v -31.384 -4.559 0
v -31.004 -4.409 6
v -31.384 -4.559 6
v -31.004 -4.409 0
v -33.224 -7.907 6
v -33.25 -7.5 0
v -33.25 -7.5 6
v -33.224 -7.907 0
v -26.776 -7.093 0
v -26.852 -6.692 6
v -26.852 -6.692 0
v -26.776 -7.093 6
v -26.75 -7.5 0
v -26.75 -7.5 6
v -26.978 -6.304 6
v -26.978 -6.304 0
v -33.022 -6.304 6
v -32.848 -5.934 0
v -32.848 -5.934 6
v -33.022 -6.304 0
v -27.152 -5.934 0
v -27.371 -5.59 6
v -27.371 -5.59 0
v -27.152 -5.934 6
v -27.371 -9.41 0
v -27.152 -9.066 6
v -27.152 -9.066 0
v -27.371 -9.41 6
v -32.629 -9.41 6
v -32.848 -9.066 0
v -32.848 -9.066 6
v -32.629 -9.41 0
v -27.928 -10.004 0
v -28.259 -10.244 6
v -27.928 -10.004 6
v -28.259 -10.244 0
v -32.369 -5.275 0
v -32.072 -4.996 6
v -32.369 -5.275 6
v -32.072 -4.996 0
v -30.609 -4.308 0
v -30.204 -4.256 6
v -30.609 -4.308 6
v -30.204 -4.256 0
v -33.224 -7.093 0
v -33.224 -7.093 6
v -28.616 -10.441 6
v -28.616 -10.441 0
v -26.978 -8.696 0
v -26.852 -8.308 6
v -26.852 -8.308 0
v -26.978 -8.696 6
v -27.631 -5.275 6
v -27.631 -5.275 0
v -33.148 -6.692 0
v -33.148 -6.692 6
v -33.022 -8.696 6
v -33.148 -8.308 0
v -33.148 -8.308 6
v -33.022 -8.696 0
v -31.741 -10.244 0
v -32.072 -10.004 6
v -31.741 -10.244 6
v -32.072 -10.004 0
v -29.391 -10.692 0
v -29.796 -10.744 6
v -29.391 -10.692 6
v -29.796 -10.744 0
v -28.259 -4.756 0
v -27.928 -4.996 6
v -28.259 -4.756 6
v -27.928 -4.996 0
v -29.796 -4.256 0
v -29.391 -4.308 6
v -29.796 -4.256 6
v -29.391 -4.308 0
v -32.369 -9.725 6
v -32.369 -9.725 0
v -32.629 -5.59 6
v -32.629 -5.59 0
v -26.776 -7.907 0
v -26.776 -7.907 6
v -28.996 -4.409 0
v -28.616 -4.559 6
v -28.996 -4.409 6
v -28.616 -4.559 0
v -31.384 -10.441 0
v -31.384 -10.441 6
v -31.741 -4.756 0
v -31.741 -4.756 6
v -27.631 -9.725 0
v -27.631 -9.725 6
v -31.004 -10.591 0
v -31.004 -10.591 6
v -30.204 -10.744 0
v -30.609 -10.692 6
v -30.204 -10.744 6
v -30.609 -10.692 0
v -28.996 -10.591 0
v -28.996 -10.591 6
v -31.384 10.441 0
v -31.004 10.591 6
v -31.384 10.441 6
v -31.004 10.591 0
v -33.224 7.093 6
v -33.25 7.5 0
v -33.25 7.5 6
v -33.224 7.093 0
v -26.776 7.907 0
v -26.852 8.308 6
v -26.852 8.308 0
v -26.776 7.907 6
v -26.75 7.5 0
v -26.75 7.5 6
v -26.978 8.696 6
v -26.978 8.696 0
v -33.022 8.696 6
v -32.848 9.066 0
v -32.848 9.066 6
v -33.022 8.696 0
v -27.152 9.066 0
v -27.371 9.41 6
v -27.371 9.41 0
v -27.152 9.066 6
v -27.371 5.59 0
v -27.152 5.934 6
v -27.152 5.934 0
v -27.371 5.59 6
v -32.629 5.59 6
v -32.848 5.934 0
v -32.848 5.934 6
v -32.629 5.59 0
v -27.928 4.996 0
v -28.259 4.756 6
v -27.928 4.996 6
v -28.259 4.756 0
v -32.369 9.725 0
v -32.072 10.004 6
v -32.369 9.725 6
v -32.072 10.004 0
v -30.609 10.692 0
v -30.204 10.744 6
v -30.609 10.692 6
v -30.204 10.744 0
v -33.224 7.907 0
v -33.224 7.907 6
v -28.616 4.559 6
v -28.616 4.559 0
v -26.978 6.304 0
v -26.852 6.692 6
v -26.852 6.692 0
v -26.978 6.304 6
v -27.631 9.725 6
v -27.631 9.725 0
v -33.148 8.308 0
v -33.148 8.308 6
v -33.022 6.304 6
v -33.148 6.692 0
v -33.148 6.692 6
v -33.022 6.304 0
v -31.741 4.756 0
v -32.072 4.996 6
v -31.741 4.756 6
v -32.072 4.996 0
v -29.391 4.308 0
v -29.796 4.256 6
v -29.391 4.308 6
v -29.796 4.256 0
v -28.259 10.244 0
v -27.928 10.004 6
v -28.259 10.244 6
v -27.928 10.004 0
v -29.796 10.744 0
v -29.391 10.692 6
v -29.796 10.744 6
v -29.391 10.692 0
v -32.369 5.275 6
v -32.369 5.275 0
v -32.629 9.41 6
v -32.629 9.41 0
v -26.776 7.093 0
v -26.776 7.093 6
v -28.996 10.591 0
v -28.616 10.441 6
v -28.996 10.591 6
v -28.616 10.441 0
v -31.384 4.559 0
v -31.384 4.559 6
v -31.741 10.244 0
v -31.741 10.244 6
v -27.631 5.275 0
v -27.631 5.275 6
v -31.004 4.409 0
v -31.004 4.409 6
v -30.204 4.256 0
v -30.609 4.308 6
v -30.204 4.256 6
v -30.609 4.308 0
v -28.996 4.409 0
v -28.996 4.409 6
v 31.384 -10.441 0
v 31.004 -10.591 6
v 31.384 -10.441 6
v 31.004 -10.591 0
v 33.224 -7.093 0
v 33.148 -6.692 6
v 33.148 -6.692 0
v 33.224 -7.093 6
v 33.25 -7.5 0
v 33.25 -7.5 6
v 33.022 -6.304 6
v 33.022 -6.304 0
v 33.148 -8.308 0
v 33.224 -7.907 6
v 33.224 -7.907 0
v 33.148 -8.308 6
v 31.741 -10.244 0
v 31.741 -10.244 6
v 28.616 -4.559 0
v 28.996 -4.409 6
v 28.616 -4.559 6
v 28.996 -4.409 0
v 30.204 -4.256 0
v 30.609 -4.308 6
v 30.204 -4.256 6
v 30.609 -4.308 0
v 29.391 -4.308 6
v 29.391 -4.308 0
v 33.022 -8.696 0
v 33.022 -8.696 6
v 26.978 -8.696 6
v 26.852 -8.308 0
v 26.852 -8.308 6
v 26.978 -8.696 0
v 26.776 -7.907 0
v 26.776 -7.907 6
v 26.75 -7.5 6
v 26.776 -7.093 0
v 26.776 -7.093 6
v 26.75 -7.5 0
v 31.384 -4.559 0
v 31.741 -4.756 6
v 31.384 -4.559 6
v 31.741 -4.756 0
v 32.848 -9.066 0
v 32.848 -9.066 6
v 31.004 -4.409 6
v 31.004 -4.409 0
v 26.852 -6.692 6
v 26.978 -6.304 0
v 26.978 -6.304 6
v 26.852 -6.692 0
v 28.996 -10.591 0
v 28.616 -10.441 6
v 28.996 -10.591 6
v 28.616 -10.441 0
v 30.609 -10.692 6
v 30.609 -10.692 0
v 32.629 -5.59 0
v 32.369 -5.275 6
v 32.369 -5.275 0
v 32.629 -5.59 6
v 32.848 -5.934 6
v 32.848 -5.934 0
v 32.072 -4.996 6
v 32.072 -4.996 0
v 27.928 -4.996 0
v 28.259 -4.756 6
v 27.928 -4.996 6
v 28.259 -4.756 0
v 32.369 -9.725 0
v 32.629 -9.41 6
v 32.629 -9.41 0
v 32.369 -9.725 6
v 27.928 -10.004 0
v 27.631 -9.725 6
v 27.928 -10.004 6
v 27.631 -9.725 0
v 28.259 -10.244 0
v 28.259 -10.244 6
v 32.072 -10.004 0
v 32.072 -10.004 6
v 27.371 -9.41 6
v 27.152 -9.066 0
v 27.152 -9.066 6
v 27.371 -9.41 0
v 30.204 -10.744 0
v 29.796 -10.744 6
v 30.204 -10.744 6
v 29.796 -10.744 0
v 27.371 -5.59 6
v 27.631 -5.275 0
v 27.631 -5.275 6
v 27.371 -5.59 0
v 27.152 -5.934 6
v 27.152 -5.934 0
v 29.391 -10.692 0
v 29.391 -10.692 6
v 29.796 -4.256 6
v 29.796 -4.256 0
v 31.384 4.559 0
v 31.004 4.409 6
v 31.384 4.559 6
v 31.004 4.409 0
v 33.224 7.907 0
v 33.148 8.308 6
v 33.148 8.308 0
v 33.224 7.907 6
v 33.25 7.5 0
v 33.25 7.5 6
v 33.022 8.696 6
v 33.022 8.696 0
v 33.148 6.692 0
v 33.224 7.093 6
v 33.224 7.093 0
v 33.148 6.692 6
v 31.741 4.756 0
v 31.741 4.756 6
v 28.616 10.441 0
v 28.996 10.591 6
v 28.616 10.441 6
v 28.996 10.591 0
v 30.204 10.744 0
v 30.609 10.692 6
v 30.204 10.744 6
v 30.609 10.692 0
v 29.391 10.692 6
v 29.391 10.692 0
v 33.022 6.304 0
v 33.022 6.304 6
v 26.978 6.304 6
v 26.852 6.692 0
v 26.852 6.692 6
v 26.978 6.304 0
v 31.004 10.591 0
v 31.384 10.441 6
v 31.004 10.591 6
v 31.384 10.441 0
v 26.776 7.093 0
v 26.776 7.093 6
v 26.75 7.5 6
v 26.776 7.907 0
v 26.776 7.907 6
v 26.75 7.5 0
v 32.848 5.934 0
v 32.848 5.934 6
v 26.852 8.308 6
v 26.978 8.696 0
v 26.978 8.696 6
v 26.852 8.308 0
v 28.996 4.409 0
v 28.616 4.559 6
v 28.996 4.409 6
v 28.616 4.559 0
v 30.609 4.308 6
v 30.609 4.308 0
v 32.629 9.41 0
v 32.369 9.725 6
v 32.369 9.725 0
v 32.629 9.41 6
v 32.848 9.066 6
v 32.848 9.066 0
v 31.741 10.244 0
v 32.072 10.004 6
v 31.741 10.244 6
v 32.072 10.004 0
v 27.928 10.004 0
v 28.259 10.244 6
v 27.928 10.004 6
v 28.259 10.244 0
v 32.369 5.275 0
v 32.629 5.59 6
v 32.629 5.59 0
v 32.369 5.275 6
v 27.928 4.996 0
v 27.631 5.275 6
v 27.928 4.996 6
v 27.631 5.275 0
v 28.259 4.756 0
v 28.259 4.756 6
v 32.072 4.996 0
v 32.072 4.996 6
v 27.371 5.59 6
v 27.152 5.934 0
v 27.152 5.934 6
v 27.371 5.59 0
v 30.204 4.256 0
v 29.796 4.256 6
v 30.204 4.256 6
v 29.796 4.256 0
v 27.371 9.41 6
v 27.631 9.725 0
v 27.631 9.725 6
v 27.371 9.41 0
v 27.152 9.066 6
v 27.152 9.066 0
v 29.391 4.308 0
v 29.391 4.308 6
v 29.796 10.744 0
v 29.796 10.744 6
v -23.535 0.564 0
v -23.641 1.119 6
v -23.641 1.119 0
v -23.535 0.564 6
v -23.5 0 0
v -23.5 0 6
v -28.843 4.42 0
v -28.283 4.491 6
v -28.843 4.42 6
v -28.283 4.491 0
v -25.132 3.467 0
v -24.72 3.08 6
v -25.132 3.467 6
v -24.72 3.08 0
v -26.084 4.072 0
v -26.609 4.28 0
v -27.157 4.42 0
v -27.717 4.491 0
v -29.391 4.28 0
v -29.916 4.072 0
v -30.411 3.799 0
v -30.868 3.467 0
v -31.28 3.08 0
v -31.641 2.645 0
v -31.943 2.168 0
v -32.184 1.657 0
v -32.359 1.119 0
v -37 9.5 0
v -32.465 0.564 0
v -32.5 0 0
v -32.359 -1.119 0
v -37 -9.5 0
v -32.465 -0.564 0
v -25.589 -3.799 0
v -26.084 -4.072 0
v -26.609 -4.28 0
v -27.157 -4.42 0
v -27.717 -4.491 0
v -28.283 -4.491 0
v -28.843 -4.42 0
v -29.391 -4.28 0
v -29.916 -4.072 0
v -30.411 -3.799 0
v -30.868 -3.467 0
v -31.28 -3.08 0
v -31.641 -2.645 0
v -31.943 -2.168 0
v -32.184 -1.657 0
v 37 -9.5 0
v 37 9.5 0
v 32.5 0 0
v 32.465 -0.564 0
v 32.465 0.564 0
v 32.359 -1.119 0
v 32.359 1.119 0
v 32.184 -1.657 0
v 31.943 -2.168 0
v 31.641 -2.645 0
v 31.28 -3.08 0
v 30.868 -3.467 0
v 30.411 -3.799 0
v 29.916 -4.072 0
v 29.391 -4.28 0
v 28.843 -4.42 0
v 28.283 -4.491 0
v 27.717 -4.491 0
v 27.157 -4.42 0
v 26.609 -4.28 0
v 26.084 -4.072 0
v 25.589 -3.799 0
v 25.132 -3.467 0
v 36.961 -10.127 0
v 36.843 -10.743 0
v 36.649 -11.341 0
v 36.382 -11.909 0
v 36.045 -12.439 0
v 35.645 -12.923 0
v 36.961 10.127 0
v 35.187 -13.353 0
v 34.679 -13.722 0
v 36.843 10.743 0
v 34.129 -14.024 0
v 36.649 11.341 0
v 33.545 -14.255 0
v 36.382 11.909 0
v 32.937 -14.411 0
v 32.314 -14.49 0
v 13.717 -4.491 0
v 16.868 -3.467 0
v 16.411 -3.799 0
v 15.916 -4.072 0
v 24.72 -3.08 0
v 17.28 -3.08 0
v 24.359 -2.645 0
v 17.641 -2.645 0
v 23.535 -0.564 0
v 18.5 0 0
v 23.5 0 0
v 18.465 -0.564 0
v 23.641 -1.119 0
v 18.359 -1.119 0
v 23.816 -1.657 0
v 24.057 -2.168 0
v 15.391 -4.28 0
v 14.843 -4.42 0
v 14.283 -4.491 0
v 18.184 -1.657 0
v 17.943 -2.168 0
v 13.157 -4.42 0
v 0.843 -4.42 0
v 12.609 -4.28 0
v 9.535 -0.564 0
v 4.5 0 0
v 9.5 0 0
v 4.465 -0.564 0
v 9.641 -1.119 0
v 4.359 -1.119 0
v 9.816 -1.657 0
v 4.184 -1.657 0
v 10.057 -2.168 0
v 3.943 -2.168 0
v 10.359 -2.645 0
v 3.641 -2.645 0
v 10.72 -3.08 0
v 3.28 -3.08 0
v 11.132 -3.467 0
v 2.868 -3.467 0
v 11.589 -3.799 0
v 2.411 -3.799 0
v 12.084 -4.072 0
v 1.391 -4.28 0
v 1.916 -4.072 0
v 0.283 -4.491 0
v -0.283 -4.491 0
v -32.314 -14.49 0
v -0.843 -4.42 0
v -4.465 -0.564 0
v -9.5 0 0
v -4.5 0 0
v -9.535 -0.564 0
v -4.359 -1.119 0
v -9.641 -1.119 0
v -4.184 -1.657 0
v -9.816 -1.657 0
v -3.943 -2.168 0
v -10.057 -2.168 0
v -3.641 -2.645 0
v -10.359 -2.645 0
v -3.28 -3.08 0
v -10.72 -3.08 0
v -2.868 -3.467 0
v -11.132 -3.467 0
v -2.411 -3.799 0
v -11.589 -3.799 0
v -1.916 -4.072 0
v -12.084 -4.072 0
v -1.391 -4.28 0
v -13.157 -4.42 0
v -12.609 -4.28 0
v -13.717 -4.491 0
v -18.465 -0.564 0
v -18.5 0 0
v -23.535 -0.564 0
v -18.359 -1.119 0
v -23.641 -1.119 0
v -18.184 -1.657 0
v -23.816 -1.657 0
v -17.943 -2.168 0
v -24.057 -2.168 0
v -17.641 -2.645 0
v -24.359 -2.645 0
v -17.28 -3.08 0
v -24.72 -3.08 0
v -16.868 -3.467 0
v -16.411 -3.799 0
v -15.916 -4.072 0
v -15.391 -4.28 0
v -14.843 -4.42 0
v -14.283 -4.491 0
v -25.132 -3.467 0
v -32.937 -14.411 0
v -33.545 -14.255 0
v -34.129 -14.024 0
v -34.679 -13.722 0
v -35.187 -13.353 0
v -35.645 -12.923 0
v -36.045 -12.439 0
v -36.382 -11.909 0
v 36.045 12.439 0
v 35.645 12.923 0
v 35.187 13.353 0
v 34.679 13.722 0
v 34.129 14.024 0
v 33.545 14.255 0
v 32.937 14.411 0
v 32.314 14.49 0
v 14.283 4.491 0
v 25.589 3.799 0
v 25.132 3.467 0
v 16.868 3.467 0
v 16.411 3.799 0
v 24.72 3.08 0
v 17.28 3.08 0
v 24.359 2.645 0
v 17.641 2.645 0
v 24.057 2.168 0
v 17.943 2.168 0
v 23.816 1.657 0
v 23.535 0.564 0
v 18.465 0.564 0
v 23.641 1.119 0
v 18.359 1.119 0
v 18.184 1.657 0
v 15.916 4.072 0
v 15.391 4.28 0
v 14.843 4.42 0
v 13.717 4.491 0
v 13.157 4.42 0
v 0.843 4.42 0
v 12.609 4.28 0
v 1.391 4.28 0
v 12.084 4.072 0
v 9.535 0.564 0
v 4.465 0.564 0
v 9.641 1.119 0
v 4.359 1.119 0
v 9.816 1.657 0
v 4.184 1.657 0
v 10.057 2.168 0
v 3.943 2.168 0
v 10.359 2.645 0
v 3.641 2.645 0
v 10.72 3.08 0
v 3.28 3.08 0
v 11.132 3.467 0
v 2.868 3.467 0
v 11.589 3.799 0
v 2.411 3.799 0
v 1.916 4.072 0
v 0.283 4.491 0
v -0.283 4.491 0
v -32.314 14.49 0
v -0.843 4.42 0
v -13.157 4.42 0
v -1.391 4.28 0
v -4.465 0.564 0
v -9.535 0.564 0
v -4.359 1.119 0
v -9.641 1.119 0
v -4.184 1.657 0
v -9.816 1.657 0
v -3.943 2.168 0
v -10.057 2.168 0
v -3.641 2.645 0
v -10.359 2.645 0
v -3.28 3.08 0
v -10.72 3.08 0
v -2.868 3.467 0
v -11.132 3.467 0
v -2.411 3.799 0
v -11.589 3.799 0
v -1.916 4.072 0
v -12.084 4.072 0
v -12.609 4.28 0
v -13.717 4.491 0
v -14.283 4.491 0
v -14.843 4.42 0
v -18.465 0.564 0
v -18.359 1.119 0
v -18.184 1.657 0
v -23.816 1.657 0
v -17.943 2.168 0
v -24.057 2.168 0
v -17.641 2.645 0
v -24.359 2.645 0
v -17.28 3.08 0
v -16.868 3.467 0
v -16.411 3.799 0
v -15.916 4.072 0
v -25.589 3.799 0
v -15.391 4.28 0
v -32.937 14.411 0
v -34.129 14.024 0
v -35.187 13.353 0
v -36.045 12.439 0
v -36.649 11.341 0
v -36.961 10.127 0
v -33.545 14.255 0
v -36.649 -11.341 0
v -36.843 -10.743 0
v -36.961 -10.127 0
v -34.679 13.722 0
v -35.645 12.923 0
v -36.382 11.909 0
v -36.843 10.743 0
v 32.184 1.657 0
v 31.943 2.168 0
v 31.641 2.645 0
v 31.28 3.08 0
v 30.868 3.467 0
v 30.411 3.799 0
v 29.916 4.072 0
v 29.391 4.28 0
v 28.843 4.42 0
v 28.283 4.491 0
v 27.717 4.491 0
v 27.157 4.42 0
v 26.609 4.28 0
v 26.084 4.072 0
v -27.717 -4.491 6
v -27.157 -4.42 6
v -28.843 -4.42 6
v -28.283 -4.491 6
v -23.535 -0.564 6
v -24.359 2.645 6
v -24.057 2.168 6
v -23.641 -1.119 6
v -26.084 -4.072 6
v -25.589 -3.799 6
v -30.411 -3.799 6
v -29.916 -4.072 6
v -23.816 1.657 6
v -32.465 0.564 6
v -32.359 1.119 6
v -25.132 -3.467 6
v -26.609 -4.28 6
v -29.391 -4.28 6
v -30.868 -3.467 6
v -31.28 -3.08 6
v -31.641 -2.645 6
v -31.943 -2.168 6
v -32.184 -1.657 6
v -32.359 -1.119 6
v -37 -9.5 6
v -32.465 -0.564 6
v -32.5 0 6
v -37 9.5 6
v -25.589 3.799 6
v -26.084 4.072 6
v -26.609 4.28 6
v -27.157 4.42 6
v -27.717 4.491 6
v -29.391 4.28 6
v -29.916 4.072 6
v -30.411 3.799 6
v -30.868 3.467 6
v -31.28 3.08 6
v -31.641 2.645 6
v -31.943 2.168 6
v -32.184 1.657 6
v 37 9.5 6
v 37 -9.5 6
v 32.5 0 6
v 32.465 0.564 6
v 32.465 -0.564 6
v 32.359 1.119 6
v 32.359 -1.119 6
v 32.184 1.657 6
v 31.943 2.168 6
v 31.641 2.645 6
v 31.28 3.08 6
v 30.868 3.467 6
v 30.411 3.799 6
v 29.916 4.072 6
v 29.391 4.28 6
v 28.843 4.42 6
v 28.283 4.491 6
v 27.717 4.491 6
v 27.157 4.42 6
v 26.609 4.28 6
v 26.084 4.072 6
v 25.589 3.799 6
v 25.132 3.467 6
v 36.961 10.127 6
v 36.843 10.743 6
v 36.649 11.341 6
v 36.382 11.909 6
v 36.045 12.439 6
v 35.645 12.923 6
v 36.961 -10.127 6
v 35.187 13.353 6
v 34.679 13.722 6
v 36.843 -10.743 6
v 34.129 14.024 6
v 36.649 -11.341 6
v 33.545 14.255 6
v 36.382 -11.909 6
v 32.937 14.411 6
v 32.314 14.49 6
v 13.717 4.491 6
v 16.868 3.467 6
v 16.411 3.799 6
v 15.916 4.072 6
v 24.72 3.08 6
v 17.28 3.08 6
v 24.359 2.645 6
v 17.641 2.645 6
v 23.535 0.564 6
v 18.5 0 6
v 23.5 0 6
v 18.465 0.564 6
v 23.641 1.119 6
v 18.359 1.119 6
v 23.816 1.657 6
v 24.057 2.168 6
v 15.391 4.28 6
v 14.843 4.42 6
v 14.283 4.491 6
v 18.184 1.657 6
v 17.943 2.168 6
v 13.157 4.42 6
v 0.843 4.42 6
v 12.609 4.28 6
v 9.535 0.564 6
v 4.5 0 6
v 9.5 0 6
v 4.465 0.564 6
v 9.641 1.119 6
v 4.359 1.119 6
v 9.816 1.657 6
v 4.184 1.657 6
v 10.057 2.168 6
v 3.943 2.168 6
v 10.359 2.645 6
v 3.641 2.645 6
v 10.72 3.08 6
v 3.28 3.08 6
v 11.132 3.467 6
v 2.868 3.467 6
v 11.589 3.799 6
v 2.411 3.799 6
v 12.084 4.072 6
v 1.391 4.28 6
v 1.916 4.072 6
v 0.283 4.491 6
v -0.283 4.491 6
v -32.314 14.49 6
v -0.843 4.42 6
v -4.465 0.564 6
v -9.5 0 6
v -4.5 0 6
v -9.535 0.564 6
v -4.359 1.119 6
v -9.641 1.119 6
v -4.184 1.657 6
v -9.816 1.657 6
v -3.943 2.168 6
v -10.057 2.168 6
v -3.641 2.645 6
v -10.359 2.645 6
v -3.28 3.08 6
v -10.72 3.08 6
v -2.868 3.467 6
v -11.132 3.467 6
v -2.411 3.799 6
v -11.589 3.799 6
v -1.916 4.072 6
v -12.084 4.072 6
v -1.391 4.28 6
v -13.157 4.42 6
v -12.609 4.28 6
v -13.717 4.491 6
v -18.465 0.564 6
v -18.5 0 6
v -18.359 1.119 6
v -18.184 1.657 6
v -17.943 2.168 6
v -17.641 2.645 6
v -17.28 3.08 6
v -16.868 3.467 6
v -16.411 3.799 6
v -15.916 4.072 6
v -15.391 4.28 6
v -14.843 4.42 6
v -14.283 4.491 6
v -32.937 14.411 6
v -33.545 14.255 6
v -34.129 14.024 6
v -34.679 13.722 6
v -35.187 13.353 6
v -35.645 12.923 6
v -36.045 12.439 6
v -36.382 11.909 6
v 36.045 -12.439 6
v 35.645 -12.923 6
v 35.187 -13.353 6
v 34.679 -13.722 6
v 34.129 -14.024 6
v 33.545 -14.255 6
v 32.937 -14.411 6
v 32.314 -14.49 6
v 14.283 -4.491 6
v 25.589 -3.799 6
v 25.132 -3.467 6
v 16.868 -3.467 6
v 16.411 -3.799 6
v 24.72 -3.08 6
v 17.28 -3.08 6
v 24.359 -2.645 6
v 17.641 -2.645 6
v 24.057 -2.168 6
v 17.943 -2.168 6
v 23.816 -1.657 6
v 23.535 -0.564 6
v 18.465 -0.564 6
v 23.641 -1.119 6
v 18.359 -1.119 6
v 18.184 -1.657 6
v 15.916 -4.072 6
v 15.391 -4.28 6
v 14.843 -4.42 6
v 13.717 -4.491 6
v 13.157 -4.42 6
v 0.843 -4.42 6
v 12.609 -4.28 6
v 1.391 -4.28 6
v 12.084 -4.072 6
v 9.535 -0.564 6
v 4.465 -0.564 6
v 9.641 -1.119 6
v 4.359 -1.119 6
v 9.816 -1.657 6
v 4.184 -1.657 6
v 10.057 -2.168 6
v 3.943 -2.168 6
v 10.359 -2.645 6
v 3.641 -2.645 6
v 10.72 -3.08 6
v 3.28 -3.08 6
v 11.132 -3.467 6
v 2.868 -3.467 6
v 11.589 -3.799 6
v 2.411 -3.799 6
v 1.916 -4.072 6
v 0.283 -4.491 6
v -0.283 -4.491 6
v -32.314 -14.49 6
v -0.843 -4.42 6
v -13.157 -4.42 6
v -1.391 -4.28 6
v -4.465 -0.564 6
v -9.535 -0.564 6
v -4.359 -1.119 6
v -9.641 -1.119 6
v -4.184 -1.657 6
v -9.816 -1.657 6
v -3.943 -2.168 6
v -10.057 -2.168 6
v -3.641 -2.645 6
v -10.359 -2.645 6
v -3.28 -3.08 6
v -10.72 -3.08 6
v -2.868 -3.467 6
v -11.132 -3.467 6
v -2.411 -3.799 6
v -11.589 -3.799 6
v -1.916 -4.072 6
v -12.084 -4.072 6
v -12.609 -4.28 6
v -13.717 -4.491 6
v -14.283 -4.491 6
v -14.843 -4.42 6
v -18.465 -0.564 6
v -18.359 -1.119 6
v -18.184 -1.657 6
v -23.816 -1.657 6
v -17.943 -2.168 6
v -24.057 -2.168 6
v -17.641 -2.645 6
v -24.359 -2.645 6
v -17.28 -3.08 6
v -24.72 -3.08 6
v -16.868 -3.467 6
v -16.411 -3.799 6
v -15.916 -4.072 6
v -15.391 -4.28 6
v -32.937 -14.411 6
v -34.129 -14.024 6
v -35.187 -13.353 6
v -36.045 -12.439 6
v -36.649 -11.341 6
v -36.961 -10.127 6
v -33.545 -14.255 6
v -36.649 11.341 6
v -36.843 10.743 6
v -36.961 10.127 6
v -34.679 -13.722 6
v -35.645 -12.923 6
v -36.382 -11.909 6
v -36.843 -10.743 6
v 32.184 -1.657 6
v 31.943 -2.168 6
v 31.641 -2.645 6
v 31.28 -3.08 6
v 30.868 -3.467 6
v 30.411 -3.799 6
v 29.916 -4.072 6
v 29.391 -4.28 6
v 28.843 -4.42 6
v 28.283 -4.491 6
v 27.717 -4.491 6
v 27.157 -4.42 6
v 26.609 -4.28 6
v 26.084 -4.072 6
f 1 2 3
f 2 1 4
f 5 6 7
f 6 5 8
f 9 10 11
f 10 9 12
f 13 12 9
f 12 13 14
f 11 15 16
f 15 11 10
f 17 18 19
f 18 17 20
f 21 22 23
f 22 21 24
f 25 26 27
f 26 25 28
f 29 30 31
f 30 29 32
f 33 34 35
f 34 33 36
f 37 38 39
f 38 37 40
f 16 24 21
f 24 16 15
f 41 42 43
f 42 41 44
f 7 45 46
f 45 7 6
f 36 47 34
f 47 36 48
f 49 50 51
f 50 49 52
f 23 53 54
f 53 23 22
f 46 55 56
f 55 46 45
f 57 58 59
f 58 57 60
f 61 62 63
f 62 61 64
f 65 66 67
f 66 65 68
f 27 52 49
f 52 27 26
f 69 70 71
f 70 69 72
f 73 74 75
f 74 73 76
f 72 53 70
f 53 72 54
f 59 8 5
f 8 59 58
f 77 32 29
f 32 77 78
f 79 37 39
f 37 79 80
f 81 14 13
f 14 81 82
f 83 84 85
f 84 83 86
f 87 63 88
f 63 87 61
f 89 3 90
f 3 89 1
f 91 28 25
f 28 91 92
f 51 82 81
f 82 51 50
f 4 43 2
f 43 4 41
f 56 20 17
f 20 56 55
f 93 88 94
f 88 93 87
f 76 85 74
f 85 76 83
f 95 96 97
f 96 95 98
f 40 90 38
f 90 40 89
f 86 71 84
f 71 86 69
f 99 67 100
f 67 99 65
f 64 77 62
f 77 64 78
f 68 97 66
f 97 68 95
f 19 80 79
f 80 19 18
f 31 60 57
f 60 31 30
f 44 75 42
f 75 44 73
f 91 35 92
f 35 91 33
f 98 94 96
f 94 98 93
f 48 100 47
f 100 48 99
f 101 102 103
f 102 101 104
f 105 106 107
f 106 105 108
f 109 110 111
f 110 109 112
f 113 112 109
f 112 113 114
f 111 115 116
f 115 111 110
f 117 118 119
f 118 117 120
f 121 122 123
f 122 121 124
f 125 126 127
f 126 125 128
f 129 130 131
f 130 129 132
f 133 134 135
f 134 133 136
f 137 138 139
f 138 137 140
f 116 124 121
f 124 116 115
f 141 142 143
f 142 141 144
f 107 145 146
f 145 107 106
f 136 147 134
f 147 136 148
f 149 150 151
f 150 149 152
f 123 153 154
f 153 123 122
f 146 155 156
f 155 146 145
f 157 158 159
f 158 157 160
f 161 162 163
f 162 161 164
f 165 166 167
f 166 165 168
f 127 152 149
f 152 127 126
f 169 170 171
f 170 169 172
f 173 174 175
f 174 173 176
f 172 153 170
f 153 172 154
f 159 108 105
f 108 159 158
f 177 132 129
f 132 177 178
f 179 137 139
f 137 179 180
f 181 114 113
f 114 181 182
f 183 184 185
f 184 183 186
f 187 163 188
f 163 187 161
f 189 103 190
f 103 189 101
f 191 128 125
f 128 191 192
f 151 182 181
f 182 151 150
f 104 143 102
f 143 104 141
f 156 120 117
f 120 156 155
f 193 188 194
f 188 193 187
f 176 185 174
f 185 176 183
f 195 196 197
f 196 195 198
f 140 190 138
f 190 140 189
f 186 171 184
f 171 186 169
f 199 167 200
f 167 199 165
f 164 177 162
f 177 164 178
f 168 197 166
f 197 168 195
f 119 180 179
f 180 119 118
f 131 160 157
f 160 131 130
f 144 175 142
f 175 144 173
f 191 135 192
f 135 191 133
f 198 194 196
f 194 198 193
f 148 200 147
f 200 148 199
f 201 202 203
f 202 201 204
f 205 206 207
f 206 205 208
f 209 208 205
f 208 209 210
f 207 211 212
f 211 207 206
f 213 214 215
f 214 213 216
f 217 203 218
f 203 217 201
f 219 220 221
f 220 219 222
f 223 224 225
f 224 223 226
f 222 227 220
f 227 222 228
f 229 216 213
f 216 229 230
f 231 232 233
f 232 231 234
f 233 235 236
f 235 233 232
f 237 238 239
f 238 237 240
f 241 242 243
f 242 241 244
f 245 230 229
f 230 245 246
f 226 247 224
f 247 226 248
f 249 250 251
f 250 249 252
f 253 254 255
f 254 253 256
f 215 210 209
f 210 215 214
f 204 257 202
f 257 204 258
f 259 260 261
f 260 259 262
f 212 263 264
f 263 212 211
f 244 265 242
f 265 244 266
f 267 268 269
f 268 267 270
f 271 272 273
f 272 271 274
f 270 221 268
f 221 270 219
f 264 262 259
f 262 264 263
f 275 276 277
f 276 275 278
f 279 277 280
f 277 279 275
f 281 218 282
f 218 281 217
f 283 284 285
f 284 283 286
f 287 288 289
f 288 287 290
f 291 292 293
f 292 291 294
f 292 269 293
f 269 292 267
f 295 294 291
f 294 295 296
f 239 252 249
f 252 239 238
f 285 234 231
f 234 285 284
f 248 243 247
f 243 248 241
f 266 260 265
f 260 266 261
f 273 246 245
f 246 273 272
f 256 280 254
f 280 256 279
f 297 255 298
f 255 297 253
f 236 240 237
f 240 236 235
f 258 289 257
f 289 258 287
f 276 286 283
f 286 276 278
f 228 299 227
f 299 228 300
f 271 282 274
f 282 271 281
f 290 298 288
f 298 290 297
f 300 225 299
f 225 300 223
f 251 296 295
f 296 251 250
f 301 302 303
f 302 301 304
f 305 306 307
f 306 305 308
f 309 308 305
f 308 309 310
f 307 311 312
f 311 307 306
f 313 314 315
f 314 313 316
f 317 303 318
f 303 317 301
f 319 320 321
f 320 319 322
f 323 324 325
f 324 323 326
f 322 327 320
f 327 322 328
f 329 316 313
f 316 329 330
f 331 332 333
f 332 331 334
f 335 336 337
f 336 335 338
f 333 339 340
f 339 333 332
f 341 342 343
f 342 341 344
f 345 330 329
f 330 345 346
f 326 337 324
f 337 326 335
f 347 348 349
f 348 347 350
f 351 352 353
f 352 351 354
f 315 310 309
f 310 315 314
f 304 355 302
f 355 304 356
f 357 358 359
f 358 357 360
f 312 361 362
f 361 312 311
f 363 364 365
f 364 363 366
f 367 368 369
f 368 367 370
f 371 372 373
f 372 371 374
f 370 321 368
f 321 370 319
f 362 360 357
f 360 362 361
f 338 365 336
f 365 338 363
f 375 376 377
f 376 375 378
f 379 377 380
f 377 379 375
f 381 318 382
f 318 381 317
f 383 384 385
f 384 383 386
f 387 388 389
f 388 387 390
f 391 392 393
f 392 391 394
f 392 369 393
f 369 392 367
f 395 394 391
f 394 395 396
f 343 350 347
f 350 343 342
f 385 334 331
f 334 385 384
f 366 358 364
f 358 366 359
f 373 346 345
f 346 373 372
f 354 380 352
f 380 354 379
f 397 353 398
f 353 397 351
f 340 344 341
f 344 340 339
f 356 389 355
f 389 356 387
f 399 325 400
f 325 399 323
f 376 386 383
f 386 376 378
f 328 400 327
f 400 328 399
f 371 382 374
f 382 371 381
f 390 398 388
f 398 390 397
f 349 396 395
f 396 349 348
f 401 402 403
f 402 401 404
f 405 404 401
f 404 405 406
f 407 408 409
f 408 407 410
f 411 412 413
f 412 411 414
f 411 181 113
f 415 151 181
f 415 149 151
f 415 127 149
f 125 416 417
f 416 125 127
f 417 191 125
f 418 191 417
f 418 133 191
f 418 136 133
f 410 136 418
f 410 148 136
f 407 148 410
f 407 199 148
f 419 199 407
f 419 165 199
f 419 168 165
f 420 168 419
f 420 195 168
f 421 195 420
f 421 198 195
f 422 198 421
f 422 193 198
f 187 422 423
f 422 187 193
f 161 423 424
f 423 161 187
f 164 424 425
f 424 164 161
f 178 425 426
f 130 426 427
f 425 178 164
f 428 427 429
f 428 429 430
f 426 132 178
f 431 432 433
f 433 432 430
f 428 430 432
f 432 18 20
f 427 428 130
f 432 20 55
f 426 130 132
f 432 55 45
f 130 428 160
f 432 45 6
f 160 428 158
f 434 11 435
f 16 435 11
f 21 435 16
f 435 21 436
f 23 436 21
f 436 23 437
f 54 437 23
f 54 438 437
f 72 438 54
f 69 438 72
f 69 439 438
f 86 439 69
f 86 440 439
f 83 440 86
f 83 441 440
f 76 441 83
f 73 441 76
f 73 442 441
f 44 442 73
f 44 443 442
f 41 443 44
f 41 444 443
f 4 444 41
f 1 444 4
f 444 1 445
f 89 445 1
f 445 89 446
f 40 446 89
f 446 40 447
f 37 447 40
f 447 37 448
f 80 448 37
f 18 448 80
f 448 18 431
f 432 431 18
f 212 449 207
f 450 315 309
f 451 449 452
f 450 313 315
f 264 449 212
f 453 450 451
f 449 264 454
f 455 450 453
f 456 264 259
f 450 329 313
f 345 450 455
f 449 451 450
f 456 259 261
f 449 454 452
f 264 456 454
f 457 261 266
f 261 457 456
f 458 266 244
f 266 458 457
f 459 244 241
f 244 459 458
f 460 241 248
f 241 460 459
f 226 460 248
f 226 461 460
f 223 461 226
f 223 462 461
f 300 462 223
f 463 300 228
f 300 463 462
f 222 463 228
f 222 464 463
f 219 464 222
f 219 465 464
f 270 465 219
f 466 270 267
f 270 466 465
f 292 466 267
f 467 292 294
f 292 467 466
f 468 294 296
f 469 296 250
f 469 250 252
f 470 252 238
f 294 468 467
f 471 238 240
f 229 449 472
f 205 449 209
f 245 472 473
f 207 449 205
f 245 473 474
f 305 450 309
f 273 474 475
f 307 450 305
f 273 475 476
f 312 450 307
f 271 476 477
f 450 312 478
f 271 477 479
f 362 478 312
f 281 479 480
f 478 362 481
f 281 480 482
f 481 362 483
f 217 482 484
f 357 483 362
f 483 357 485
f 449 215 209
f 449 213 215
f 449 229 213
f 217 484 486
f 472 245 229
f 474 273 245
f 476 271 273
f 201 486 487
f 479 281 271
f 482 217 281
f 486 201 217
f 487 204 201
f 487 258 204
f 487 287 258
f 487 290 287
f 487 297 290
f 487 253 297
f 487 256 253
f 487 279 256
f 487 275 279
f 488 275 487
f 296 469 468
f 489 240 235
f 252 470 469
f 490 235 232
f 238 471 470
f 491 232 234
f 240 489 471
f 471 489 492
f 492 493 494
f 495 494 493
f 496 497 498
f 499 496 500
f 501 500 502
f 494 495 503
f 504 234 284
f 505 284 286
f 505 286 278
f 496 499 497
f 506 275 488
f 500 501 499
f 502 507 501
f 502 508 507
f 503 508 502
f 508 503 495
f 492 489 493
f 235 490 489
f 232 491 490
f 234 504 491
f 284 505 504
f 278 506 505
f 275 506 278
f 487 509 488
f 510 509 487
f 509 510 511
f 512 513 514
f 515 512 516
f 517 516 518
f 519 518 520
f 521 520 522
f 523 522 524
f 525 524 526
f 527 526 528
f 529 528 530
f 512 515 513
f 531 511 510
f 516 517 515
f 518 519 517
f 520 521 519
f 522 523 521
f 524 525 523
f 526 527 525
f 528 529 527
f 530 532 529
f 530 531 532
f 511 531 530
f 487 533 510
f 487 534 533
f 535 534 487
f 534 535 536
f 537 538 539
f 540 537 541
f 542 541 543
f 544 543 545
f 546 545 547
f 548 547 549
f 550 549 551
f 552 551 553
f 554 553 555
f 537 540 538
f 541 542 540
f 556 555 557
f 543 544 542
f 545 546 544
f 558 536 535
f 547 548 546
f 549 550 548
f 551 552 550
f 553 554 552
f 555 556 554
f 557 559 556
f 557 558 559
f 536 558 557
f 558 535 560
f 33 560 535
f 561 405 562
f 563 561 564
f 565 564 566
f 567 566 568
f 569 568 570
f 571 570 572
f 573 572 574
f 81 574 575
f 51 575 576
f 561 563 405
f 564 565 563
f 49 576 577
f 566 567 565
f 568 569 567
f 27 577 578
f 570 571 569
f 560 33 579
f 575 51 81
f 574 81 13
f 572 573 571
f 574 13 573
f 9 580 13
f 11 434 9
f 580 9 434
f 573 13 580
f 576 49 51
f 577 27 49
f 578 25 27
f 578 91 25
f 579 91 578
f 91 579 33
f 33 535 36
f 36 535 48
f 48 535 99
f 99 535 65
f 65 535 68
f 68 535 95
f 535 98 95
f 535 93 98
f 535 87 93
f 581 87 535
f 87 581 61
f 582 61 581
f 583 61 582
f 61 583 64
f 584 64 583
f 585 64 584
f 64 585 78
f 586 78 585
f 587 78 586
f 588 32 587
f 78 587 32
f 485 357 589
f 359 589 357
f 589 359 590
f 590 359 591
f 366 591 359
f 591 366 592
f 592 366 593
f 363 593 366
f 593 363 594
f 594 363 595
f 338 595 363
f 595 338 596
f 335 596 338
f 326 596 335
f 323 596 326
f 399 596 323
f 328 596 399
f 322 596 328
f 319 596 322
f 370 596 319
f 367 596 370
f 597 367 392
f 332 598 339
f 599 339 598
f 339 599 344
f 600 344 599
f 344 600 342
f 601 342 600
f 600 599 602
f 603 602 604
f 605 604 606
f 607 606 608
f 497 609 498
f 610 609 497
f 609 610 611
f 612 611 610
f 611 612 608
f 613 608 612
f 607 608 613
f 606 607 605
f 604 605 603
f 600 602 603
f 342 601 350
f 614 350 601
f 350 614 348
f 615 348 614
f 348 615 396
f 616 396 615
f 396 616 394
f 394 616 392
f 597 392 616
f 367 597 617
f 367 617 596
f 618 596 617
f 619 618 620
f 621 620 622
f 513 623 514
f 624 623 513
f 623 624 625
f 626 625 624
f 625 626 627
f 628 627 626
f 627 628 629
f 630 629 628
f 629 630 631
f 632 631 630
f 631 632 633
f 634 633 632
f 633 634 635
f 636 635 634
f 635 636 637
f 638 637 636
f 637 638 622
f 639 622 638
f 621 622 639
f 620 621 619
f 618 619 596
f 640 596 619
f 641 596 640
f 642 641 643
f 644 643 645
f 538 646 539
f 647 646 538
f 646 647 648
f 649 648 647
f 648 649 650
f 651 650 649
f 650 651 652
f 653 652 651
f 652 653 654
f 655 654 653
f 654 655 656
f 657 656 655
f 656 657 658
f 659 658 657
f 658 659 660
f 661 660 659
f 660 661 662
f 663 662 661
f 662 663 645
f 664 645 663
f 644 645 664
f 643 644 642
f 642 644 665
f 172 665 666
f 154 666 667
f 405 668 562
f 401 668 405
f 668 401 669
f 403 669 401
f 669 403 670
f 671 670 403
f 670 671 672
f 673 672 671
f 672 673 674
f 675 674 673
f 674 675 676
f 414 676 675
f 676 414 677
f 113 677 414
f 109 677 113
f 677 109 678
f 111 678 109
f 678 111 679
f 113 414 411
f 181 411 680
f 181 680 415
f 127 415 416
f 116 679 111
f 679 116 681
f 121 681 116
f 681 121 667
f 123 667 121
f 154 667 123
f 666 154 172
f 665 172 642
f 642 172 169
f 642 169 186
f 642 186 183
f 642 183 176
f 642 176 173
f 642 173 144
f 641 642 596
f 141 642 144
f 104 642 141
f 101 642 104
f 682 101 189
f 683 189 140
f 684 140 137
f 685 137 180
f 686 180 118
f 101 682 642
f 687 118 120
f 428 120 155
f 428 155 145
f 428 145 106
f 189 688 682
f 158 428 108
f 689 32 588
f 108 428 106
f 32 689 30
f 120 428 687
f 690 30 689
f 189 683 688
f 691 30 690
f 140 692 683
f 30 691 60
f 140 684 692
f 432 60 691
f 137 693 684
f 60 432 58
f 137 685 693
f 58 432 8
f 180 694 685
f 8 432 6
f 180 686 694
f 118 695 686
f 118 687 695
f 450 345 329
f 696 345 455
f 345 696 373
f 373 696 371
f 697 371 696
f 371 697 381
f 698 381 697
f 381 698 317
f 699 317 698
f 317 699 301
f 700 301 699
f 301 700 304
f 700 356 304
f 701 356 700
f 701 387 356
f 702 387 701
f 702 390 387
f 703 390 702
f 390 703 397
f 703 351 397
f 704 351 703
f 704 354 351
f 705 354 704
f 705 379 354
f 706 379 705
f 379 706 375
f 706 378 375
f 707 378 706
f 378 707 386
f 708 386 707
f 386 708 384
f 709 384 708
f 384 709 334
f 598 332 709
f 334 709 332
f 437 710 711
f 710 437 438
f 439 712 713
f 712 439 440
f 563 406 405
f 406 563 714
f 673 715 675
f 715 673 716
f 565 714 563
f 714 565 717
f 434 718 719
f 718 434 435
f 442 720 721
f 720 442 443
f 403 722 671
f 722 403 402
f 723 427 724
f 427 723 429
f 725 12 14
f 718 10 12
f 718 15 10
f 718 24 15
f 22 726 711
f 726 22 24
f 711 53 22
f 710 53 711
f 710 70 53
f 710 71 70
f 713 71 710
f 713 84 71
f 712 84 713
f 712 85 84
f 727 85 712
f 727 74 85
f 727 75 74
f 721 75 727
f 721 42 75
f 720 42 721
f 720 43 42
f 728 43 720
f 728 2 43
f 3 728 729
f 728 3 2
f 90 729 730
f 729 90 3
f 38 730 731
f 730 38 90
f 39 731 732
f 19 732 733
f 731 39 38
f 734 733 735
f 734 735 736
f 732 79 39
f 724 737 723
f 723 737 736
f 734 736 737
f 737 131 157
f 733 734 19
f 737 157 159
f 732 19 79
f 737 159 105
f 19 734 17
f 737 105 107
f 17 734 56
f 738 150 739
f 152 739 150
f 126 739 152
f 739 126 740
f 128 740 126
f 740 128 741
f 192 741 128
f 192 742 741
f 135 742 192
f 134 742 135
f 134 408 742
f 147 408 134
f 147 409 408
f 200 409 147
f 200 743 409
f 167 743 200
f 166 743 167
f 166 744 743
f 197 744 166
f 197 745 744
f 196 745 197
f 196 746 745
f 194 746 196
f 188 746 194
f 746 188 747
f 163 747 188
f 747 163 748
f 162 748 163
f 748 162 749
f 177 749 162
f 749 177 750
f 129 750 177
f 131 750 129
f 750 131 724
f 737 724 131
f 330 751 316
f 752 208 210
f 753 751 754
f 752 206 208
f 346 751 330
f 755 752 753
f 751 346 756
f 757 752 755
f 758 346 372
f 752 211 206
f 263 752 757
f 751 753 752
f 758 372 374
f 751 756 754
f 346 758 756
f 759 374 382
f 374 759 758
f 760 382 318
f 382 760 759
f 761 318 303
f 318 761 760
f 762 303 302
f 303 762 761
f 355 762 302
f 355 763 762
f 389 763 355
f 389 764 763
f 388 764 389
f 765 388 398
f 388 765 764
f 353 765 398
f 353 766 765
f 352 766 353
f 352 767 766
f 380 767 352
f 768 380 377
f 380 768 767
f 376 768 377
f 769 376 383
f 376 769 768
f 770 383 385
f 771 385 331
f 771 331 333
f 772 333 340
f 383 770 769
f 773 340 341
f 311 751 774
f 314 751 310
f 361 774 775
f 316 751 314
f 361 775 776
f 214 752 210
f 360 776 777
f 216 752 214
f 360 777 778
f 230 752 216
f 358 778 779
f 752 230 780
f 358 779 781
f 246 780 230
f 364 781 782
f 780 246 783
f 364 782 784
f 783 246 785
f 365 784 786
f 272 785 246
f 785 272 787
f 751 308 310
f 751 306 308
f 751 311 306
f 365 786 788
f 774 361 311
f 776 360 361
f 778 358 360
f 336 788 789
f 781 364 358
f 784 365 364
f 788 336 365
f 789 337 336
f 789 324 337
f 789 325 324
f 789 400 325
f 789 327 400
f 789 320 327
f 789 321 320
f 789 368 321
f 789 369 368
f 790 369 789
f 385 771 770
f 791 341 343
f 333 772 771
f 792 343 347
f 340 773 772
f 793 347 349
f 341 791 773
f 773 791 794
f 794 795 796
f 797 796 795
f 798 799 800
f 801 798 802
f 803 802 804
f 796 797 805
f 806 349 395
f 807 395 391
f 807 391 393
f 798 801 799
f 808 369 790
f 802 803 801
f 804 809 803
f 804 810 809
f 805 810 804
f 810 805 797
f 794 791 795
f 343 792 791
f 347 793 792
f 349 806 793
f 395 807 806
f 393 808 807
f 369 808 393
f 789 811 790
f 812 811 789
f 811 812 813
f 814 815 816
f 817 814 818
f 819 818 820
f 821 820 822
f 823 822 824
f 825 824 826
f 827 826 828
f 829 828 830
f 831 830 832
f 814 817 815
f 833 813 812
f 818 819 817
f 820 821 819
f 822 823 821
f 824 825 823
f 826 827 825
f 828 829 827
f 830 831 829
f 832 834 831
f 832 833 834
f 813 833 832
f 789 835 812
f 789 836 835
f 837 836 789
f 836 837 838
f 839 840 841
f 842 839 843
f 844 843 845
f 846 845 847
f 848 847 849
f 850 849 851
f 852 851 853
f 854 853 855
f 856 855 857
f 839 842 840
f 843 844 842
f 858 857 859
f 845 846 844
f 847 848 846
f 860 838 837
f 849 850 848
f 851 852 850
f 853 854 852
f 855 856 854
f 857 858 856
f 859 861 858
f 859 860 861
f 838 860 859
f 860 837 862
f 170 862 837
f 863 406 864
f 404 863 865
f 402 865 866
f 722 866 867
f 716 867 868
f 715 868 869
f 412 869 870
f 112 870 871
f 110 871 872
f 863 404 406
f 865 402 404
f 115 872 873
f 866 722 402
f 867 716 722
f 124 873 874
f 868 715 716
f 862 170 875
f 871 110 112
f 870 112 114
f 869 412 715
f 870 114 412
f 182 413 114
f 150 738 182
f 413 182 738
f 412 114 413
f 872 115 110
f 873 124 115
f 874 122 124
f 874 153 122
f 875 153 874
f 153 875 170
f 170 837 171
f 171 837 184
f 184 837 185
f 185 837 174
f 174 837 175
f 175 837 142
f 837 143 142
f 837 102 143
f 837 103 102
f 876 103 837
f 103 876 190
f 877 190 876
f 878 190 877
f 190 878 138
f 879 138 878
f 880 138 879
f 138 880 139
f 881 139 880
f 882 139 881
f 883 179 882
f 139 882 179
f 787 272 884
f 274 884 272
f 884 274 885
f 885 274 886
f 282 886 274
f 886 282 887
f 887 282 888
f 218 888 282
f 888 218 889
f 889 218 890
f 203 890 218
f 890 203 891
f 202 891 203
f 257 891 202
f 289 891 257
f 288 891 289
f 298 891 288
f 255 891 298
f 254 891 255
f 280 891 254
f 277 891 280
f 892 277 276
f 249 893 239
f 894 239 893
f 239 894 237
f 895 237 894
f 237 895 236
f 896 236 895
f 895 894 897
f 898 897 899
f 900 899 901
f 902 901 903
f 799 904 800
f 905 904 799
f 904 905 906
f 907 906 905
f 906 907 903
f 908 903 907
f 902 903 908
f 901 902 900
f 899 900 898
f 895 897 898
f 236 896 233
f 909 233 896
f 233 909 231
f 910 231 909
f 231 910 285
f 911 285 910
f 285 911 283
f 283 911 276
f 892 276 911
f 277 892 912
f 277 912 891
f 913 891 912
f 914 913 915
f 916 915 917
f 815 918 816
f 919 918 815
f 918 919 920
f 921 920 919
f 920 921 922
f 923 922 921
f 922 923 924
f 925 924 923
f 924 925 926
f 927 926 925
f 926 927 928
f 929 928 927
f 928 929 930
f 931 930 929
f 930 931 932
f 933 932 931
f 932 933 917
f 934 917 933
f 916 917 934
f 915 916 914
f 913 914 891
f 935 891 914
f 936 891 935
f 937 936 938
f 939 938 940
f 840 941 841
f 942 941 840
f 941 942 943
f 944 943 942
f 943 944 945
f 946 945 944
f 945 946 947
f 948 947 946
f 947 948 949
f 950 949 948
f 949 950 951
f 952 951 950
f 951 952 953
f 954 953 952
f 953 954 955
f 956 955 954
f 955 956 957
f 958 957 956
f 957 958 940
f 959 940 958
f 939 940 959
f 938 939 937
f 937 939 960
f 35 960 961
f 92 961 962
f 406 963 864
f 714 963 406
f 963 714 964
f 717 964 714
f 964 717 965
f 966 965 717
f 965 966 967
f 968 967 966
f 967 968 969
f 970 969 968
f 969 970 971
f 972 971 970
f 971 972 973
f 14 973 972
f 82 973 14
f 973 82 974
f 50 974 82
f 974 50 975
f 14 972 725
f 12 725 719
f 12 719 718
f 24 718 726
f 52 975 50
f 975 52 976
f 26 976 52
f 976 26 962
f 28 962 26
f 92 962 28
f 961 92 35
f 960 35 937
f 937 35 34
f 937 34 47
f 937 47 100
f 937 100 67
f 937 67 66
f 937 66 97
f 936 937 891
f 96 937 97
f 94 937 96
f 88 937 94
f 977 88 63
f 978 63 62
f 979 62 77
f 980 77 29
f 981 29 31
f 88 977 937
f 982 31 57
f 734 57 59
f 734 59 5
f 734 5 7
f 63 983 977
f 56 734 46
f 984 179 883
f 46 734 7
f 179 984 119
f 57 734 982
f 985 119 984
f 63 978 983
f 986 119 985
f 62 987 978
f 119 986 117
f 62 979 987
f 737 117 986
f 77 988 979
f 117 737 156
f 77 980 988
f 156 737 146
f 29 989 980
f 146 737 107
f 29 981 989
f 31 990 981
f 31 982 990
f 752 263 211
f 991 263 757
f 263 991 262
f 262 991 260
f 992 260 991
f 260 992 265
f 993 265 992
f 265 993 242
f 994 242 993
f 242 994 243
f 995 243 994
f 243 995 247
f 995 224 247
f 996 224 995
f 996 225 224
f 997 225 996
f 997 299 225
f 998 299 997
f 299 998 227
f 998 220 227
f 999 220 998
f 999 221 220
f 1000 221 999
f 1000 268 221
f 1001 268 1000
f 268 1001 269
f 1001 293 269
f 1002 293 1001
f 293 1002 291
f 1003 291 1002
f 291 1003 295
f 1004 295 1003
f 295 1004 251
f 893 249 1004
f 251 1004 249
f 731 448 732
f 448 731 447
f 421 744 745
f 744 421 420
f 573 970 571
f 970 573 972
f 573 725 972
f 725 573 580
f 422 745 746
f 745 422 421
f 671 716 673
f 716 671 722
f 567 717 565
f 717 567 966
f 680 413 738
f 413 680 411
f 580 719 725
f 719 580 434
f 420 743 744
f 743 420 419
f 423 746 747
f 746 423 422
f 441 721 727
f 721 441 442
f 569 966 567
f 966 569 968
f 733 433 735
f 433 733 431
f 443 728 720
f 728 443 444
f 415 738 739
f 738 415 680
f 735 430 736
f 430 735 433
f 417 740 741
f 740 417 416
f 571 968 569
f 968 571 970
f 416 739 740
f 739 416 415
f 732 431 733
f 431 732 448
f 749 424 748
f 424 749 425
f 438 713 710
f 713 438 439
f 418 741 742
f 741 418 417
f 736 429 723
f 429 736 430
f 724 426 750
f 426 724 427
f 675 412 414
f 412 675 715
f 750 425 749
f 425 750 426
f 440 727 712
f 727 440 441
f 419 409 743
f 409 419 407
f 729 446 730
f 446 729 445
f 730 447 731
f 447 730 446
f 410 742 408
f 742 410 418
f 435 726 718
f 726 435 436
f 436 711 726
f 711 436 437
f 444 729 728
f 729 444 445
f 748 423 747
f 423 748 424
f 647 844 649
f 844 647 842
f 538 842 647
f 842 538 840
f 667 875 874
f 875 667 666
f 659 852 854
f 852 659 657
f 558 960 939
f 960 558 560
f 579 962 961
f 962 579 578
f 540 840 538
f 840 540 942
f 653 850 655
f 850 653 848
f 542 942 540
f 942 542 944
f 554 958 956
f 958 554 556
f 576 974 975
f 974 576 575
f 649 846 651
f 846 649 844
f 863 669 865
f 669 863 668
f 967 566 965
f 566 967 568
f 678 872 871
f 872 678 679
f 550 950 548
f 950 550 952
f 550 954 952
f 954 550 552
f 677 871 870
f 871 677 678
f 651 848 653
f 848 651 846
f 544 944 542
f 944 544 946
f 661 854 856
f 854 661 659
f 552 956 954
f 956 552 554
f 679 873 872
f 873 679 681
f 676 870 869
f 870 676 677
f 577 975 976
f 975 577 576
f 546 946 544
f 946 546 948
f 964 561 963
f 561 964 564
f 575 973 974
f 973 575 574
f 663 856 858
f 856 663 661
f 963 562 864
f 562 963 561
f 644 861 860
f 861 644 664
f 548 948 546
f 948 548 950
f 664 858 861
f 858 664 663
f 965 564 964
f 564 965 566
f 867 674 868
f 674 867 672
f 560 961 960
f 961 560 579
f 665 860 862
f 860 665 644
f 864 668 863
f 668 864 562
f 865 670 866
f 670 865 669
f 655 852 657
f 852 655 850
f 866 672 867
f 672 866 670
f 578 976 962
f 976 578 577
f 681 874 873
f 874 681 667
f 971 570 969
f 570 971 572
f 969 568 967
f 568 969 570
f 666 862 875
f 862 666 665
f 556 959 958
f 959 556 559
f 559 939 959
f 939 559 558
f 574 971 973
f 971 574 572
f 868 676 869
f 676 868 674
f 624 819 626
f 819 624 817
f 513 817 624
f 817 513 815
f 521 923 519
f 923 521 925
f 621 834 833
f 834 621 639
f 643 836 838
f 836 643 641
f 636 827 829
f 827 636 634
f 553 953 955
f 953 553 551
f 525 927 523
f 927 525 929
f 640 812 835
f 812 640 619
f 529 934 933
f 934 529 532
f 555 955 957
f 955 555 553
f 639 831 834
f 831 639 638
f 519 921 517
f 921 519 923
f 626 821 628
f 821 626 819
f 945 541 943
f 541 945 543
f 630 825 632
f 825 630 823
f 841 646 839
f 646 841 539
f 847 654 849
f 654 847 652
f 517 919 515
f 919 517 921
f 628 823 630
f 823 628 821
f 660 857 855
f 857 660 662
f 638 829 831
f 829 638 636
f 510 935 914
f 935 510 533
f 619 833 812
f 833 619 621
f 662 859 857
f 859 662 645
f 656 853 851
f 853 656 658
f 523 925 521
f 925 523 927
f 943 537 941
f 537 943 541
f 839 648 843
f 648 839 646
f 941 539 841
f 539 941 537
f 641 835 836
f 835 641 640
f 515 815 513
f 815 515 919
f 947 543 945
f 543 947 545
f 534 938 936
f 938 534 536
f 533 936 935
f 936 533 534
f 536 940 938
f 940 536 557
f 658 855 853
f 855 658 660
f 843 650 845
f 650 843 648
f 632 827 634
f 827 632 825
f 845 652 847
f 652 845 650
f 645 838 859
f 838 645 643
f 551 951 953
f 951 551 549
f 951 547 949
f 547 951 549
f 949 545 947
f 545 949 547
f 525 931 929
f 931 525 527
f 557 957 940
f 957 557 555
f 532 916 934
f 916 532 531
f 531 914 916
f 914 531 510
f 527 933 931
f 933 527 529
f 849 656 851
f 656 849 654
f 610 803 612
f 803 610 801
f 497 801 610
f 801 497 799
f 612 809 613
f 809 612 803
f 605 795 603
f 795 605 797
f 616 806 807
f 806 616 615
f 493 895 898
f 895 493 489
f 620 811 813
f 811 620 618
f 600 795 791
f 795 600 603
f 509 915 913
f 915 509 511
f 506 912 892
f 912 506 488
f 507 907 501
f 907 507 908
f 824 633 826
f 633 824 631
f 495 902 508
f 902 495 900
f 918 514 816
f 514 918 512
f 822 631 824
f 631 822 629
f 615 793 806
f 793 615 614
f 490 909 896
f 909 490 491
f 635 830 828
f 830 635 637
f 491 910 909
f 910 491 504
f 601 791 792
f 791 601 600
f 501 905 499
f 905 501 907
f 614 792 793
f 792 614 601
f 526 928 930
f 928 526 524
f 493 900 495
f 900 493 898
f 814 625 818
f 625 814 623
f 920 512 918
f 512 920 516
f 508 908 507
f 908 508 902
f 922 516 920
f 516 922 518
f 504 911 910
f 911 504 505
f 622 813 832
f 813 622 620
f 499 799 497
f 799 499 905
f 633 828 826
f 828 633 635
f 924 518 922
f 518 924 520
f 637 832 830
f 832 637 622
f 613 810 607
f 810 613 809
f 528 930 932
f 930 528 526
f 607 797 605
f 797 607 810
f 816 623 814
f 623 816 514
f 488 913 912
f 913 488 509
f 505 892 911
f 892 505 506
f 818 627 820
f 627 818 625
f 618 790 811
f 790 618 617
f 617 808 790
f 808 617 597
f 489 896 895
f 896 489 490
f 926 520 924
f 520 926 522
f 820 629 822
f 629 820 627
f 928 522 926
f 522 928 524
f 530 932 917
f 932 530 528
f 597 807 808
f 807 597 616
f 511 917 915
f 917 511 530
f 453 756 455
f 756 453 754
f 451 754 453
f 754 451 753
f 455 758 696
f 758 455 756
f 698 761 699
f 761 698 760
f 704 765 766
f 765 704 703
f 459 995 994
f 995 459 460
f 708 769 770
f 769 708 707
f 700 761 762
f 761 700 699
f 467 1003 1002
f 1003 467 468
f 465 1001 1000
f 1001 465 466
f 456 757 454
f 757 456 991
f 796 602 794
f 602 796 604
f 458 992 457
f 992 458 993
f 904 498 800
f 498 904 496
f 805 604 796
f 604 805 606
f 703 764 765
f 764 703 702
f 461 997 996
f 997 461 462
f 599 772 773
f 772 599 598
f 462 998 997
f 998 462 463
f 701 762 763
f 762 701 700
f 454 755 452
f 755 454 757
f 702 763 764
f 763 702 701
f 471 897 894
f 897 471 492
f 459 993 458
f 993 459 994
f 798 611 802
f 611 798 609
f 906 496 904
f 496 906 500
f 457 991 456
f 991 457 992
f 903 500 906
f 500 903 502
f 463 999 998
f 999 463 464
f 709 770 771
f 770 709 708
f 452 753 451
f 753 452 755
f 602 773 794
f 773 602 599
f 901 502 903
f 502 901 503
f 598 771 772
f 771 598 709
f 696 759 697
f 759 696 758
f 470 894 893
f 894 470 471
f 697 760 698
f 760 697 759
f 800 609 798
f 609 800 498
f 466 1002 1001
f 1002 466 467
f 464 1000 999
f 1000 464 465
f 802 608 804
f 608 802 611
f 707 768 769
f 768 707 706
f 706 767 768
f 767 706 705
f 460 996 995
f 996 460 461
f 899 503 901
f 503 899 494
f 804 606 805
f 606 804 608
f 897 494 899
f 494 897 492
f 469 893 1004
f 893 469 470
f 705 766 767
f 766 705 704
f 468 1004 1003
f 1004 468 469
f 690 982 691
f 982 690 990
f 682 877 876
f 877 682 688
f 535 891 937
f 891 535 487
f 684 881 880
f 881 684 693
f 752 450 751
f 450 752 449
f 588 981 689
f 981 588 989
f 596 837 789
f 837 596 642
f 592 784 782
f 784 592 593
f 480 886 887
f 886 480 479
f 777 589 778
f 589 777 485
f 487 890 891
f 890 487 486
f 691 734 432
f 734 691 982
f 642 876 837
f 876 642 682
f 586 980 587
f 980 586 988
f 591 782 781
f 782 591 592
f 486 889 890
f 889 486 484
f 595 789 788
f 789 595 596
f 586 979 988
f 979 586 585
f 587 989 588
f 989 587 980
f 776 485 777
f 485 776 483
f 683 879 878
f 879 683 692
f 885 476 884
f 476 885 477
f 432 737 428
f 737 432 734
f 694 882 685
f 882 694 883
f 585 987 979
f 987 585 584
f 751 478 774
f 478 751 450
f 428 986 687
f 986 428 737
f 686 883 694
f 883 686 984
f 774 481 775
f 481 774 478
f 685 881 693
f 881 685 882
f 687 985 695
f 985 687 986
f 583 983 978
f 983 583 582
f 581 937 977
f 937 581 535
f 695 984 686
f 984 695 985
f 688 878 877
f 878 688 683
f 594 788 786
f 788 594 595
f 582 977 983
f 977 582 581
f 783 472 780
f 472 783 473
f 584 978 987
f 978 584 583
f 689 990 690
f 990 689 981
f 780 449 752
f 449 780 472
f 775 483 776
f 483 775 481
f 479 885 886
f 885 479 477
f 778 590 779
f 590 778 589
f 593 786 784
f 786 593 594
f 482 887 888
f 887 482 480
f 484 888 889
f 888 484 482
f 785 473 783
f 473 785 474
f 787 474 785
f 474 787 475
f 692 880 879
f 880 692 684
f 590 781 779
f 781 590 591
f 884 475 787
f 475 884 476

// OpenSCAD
$fn = 50;


difference() {
	union() {
		hull() {
			translate(v = [-32.0000000000, 9.5000000000, 0]) {
				cylinder(h = 6, r = 5);
			}
			translate(v = [32.0000000000, 9.5000000000, 0]) {
				cylinder(h = 6, r = 5);
			}
			translate(v = [-32.0000000000, -9.5000000000, 0]) {
				cylinder(h = 6, r = 5);
			}
			translate(v = [32.0000000000, -9.5000000000, 0]) {
				cylinder(h = 6, r = 5);
			}
		}
	}
	union() {
		#translate(v = [-30.0000000000, -7.5000000000, -100.0000000000]) {
			cylinder(h = 200, r = 3.2500000000);
		}
		#translate(v = [-30.0000000000, 7.5000000000, -100.0000000000]) {
			cylinder(h = 200, r = 3.2500000000);
		}
		#translate(v = [30.0000000000, -7.5000000000, -100.0000000000]) {
			cylinder(h = 200, r = 3.2500000000);
		}
		#translate(v = [30.0000000000, 7.5000000000, -100.0000000000]) {
			cylinder(h = 200, r = 3.2500000000);
		}
		#translate(v = [-28.0000000000, 0, 0]) {
			cylinder(h = 6, r = 4.5000000000);
		}
		#translate(v = [-14.0000000000, 0, 0]) {
			cylinder(h = 6, r = 4.5000000000);
		}
		#cylinder(h = 6, r = 4.5000000000);
		#translate(v = [14.0000000000, 0, 0]) {
			cylinder(h = 6, r = 4.5000000000);
		}
		#translate(v = [28.0000000000, 0, 0]) {
			cylinder(h = 6, r = 4.5000000000);
		}
	}
}
